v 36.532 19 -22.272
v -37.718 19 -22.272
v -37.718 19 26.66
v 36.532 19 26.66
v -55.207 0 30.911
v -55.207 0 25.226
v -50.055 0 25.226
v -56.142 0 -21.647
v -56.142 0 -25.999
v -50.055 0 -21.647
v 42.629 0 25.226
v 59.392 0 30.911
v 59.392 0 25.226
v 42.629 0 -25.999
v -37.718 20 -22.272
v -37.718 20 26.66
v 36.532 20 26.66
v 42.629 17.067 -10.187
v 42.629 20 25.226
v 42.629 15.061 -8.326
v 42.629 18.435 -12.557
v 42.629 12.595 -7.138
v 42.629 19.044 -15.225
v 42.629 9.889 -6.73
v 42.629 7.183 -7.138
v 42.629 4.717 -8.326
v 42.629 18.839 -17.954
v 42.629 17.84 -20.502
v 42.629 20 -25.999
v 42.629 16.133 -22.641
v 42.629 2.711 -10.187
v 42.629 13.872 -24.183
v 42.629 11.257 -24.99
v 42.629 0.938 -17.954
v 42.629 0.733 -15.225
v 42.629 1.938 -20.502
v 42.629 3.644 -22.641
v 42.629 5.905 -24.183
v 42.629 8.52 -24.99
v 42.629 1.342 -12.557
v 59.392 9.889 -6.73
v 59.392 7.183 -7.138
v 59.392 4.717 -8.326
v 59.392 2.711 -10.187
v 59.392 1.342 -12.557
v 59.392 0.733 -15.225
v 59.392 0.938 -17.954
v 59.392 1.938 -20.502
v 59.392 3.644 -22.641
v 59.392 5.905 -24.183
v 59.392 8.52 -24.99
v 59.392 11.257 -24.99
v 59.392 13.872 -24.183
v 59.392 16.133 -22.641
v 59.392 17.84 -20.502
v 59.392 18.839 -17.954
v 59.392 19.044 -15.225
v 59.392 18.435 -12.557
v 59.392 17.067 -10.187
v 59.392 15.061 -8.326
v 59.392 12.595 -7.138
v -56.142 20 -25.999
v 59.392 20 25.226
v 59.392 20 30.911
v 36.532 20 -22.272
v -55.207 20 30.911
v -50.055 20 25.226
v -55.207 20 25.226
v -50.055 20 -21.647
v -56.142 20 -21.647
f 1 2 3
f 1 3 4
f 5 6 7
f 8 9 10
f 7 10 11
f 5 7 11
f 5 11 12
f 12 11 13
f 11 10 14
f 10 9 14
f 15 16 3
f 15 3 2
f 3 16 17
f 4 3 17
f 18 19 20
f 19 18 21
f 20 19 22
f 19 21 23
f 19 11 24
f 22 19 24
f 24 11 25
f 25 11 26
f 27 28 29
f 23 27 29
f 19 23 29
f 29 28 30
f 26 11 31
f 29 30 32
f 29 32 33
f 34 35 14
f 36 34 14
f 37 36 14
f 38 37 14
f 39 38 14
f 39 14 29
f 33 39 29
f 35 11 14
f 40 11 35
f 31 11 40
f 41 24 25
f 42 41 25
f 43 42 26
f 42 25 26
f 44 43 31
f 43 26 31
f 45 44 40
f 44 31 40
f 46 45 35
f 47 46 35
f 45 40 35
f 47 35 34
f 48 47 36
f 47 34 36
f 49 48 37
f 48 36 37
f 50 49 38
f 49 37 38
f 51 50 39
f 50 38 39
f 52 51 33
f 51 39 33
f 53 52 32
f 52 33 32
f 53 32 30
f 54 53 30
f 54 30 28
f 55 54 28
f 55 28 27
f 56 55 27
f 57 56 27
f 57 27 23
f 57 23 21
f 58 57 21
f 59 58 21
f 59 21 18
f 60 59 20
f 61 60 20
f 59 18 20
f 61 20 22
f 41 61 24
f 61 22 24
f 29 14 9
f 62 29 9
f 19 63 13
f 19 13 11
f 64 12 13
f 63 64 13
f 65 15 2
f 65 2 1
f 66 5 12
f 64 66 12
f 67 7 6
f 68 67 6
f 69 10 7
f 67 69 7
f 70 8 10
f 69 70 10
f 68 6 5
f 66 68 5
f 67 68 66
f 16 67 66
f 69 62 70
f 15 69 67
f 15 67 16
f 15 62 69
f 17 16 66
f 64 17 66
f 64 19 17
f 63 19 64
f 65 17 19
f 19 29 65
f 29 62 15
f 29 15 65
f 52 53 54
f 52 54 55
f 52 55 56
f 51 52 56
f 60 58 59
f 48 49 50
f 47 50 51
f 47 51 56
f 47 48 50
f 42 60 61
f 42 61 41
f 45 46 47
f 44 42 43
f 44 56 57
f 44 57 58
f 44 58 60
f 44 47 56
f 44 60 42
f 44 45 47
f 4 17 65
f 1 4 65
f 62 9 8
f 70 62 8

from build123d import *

# Parameters (mm, degrees)
BOSS_EXTRUDE1_DEPTH = 20
SKETCH2_R           = 9.180948857
BOSS_EXTRUDE2_DEPTH = 16.762555
SKETCH3_W           = 74.249943047
SKETCH3_H           = 48.931949377
CUT_EXTRUDE1_DEPTH  = 1


with BuildPart() as part:
    # Sketch1 → Boss-Extrude1 (new body)
    with BuildSketch(Plane(origin=(0, 0, 0), x_dir=(1, 0, 0), z_dir=(0, 1, 0))):
        Polygon((-50.055146164, 21.646889896), (-50.055146164, -25.226179967), (-55.206550944, -25.226179967), (-55.206550944, -30.910542614), (-31.621863062, -30.910542614), (17.979762571, -30.910542614), (59.391812496, -30.910542614), (59.391812496, -25.226179967), (42.62925771, -25.226179967), (42.62925771, 25.999180786), (-46.65640648, 25.999180786), (-56.142161298, 25.999180786), (-56.142161298, 21.646889896), align=None)
    extrude(amount=BOSS_EXTRUDE1_DEPTH)

    # Sketch2 → Boss-Extrude2 (add)
    with BuildSketch(Plane(origin=(42.62925771, 0, 0), x_dir=(0, 0, -1), z_dir=(1, 0, 0))):
        with Locations(Location((15.911282323, 9.888690044, 0), (0, 0, 180))):  # turned: the seam where the file's is
            Circle(SKETCH2_R)
    extrude(amount=BOSS_EXTRUDE2_DEPTH)

    # Sketch3 → Cut-Extrude1 (cut)
    with BuildSketch(Plane(origin=(0, 20, 0), x_dir=(1, 0, 0), z_dir=(0, 1, 0))):
        with Locations((-0.592763324, -2.194150519)):
            Rectangle(SKETCH3_W, SKETCH3_H)
    extrude(amount=-CUT_EXTRUDE1_DEPTH, mode=Mode.SUBTRACT)


solid = part.part
